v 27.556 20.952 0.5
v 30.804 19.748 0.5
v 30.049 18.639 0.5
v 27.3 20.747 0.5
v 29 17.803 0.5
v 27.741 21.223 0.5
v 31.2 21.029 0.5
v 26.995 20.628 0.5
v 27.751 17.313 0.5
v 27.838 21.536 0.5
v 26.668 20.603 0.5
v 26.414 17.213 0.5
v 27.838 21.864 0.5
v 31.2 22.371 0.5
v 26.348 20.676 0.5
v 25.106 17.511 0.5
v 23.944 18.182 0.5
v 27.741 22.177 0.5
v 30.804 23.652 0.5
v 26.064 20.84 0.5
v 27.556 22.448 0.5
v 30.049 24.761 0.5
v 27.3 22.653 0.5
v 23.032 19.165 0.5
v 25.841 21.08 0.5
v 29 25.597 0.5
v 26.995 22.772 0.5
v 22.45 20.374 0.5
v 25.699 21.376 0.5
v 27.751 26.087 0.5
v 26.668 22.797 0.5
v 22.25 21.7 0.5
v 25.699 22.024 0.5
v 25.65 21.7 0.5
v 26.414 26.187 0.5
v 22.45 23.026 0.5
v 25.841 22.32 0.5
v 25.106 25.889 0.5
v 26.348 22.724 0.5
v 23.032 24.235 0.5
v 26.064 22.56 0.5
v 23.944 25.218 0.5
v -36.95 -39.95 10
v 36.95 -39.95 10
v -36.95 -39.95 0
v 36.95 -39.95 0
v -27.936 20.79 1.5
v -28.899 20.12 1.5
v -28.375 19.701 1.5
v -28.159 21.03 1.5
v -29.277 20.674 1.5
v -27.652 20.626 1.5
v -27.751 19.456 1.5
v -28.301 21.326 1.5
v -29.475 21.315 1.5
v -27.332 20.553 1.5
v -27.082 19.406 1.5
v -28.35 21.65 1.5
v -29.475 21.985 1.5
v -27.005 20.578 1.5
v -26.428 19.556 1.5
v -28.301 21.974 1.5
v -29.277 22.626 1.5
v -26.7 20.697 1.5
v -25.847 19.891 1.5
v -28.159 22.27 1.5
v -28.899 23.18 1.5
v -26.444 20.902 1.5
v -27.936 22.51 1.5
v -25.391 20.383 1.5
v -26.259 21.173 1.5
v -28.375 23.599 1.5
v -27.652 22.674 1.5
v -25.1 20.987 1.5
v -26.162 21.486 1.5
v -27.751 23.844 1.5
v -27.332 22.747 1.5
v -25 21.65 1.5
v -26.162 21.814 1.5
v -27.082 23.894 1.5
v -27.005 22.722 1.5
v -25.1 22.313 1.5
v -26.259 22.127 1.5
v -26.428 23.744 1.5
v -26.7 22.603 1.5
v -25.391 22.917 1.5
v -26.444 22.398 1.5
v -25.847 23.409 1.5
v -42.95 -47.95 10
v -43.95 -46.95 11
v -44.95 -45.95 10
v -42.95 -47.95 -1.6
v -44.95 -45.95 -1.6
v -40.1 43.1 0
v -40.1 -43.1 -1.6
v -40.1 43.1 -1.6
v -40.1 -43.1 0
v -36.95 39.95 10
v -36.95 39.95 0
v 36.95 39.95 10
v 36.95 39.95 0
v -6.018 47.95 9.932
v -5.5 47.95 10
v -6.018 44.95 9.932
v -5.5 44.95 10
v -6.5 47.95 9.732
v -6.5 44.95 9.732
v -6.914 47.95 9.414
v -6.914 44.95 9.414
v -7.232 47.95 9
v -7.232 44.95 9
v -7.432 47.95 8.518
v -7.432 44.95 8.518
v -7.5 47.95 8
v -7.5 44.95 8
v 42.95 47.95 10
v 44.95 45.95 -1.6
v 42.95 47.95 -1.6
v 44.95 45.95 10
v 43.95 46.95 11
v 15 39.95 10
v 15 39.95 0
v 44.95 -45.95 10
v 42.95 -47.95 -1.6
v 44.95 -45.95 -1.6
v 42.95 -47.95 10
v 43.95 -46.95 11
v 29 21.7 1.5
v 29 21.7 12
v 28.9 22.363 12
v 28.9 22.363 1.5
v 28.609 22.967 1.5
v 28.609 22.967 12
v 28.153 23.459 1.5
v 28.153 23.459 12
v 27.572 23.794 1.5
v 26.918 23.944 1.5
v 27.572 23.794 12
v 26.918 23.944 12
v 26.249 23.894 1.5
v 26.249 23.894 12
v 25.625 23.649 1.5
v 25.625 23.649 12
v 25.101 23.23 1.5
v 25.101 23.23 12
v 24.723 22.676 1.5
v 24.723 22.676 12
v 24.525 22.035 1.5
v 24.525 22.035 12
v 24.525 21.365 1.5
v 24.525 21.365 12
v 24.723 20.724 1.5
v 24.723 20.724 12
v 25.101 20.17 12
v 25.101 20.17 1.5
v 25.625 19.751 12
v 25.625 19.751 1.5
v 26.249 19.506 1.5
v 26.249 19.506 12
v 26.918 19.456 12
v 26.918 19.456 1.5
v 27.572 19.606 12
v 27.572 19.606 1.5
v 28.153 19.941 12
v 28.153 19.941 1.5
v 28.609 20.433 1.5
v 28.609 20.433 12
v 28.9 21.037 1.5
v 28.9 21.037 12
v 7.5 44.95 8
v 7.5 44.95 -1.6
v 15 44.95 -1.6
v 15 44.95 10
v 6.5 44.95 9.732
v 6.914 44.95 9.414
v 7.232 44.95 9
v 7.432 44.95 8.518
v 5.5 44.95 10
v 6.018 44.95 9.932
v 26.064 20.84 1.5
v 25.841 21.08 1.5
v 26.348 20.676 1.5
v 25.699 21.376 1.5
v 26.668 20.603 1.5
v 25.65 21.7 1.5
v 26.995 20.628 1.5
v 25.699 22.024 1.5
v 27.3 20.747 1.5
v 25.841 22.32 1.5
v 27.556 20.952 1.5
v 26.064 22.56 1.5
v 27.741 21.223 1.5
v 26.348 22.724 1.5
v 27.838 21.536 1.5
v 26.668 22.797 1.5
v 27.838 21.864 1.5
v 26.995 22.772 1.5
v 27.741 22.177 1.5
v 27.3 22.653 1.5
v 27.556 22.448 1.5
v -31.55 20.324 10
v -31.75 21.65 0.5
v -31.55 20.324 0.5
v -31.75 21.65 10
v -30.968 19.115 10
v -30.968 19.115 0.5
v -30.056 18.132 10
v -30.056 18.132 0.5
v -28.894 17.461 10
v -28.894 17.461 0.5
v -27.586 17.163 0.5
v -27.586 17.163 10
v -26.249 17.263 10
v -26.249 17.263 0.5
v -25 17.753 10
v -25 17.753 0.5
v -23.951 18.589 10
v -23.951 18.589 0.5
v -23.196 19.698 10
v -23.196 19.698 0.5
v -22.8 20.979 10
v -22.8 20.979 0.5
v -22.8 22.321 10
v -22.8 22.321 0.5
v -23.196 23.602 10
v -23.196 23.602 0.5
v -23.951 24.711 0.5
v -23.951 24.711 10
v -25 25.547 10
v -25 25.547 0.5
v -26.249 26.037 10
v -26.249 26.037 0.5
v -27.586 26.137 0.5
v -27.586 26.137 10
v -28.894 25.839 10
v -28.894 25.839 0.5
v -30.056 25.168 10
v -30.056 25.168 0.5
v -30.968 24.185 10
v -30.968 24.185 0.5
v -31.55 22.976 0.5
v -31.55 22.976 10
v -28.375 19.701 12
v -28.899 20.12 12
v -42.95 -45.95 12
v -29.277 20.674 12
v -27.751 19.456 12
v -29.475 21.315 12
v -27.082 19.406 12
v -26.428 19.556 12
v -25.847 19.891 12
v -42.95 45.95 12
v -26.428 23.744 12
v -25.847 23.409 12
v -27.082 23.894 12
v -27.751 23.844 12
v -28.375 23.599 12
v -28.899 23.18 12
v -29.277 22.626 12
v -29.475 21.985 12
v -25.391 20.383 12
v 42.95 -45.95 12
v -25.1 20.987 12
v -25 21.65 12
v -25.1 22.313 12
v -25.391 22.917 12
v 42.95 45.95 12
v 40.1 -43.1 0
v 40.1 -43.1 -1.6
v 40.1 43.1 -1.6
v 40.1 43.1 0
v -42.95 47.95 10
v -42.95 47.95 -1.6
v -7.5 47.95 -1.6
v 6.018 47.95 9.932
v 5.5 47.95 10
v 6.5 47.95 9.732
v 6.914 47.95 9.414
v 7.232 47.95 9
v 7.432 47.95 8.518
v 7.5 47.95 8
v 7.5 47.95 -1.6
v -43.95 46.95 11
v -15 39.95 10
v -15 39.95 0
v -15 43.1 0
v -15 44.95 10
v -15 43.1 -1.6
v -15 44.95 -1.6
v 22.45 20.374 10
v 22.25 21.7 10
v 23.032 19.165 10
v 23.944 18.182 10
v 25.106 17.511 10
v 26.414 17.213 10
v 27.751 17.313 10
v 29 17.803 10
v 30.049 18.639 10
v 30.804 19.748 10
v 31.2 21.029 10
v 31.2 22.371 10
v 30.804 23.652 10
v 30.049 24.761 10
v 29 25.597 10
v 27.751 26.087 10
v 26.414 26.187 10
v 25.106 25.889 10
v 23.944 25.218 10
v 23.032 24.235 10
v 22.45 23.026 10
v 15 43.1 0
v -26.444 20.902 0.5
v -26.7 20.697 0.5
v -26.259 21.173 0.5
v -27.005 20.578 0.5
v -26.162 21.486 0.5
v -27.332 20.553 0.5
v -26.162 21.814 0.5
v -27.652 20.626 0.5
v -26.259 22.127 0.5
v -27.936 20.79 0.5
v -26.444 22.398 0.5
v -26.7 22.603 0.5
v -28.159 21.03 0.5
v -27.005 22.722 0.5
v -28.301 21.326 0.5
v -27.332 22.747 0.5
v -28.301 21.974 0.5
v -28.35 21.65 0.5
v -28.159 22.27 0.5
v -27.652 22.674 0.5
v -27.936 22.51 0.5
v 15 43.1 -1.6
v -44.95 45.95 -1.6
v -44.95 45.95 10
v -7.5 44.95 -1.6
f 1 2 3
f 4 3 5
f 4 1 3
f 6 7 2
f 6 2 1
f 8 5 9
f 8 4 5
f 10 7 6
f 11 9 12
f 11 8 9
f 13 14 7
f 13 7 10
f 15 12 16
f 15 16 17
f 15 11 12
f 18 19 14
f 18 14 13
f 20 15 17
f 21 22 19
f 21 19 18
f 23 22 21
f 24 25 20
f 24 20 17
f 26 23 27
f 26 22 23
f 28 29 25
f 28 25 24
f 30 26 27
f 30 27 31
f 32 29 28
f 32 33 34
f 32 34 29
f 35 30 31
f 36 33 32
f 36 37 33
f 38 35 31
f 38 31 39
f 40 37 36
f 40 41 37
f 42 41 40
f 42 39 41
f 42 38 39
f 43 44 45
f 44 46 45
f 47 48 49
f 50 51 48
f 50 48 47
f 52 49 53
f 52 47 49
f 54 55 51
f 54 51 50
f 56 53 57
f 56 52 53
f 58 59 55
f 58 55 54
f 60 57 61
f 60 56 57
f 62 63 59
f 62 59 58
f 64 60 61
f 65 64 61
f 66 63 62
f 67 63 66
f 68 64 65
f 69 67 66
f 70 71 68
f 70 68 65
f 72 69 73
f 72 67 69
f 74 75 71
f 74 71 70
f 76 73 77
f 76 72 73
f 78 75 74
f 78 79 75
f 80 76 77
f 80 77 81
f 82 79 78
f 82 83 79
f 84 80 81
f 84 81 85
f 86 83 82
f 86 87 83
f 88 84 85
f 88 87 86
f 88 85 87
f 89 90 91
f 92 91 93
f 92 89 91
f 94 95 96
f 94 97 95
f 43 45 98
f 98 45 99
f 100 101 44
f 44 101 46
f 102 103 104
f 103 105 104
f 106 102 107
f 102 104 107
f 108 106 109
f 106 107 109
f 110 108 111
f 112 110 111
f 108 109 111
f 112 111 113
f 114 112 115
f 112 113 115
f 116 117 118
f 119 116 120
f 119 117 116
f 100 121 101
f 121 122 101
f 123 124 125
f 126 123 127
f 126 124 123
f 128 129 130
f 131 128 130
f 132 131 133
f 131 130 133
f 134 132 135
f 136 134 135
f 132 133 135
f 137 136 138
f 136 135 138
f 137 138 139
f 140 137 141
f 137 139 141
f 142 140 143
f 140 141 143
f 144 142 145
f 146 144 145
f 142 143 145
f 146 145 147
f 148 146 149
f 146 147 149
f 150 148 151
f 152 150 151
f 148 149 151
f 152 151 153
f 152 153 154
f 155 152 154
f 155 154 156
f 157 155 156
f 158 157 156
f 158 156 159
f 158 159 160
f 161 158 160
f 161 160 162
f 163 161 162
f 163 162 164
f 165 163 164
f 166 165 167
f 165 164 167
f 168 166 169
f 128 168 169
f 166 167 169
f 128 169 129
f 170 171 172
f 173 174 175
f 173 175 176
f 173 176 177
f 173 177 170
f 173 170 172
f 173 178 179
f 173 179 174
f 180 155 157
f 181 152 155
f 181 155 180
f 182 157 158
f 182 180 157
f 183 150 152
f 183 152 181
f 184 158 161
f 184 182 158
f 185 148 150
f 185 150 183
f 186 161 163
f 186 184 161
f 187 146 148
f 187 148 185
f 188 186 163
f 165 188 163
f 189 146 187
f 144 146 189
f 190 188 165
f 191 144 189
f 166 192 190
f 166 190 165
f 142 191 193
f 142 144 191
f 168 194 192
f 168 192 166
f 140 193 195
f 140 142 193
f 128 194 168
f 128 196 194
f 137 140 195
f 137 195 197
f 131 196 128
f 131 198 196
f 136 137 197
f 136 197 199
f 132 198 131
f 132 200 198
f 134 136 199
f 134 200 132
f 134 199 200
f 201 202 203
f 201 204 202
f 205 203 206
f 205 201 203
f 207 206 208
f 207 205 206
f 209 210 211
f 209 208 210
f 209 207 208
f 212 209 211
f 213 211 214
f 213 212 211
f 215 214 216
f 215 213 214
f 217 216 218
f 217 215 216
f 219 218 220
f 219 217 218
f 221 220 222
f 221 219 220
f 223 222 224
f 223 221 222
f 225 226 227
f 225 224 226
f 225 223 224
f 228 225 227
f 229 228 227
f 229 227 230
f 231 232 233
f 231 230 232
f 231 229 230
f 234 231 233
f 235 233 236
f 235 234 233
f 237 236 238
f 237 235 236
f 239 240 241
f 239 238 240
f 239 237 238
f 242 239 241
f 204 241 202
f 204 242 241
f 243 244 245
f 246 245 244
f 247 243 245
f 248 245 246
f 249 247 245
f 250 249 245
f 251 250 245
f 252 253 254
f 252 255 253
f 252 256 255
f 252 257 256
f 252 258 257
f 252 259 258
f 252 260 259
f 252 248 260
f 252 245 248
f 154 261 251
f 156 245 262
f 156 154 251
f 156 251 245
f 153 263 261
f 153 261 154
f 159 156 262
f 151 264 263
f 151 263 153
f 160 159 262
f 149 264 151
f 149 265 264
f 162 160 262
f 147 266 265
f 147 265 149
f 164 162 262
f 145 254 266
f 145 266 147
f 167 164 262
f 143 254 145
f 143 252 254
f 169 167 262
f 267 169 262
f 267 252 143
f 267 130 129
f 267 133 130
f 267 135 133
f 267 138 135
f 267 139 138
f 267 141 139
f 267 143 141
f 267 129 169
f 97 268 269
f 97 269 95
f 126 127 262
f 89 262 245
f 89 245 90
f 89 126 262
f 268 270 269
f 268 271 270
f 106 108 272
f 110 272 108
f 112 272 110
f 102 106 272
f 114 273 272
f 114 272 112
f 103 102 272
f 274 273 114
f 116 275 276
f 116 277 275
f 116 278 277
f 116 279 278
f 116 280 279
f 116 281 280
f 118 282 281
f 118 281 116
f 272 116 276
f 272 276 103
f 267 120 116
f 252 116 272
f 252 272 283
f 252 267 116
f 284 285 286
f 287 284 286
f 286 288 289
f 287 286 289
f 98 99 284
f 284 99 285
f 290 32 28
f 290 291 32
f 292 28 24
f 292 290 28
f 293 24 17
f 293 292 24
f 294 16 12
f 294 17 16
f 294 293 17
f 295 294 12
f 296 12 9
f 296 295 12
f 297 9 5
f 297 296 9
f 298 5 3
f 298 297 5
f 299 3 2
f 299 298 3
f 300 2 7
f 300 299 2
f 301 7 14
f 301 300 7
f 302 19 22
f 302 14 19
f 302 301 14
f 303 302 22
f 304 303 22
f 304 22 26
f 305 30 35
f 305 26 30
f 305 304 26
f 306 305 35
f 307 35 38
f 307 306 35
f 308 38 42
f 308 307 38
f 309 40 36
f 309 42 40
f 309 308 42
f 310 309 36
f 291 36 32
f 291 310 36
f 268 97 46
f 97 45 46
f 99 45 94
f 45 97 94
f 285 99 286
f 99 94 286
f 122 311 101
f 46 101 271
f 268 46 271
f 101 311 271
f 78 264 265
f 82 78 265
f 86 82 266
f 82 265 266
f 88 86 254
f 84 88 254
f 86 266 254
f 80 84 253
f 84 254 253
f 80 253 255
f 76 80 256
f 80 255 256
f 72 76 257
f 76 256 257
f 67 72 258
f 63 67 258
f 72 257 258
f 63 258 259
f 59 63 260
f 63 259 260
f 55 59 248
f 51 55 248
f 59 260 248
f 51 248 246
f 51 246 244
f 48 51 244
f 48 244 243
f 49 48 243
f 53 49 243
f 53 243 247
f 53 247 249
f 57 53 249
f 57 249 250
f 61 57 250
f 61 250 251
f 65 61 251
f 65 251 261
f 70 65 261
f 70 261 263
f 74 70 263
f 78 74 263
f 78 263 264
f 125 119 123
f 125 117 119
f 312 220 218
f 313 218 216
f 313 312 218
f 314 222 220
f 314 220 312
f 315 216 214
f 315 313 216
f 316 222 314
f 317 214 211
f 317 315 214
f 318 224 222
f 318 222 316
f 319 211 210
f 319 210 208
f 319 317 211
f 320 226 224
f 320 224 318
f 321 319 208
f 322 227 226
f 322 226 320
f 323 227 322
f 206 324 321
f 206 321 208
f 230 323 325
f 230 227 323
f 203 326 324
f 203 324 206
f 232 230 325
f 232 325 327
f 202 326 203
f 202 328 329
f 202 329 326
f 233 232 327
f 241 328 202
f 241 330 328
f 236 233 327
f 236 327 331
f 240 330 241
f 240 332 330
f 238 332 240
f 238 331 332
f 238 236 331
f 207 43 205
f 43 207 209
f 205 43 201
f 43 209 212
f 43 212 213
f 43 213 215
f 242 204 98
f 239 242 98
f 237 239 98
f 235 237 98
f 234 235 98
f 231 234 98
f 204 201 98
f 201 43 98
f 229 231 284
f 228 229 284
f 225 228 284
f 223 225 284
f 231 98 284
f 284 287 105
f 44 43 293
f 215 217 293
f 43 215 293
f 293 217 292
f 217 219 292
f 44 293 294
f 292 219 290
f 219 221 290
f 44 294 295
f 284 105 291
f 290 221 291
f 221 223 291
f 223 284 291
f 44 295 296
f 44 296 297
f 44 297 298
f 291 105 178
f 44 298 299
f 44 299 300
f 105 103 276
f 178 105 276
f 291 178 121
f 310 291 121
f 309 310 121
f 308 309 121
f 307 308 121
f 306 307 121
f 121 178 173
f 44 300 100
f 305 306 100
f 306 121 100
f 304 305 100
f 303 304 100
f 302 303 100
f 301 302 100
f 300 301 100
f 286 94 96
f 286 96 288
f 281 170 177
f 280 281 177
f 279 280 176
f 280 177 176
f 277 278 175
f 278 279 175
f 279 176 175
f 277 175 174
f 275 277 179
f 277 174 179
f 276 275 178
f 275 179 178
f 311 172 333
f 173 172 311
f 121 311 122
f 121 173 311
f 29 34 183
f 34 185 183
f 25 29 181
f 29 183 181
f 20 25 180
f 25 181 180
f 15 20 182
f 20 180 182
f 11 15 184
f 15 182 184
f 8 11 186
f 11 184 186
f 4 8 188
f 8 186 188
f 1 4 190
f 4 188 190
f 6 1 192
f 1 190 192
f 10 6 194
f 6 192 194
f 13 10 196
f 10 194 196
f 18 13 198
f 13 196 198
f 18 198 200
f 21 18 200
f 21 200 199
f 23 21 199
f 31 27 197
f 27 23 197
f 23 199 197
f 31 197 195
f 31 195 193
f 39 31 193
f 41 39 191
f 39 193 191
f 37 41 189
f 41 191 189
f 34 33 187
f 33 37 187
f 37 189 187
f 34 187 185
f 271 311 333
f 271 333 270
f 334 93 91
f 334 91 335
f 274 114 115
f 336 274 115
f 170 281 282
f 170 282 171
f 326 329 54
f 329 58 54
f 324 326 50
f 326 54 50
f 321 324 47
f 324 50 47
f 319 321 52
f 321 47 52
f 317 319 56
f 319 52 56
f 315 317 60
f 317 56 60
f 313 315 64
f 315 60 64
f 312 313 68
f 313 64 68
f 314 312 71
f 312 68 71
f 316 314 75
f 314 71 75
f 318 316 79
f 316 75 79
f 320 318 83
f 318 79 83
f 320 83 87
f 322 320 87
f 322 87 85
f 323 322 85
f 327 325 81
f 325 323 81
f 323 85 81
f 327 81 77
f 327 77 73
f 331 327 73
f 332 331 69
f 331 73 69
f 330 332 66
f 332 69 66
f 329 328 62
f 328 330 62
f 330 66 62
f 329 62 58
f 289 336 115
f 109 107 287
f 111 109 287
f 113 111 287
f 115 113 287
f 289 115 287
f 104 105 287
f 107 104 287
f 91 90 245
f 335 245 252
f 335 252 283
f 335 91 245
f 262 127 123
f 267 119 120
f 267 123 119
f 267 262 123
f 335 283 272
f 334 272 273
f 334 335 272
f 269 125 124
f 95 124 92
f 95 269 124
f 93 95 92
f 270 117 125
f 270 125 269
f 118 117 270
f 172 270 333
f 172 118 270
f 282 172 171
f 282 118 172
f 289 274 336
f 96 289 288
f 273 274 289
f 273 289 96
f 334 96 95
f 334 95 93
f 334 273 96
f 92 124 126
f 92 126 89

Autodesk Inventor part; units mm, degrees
ref_plane "YZ Plane" through (0, 0, 0) normal (1, 0, 0) x (0, 1, 0)
ref_plane "XZ Plane" through (0, 0, 0) normal (0, 1, 0) x (-1, 0, 0)
ref_plane "XY Plane" through (0, 0, 0) normal (0, 0, 1) x (1, 0, 0)
sketch "Skizze1" plane through (0, 0, 0) normal (0, 0, 1) x (1, 0, 0)
  line L0 (-39.95, 42.95) -> (-39.95, -42.95) projected
  line L1 (-39.95, -42.95) -> (39.95, -42.95) projected
  line L2 (39.95, -42.95) -> (39.95, 42.95) projected
  line L3 (39.95, 42.95) -> (-39.95, 42.95) projected
  line L4 (-36.95, 39.95) -> (-15, 39.95)
  line L5 (36.95, 39.95) -> (36.95, -39.95)
  line L6 (36.95, -39.95) -> (-36.95, -39.95)
  line L7 (-36.95, -39.95) -> (-36.95, 39.95)
  line L8 (-36.95, 39.95) -> (36.95, -39.95) construction
  line L9 (36.95, 39.95) -> (-36.95, -39.95) construction
  line L10 (0, -67.13) -> (0, 67.13) projected
  line L11 (-15, 39.95) -> (-15, 42.95)
  line L12 (15, 39.95) -> (15, 42.95)
  line L13 (15, 39.95) -> (36.95, 39.95)
  line L14 (44.95, -47.95) -> (-44.95, -47.95)
  line L15 (-44.95, -47.95) -> (-44.95, 47.95)
  line L16 (-44.95, 47.95) -> (-15, 47.95)
  line L17 (44.95, 47.95) -> (44.95, -47.95)
  line L18 (44.95, -47.95) -> (-44.95, 47.95) construction
  line L19 (-44.95, -47.95) -> (44.95, 47.95) construction
  line L20 (-15, 42.95) -> (-15, 47.95)
  line L21 (15, 42.95) -> (15, 47.95)
  line L22 (15, 47.95) -> (44.95, 47.95)
  point P0 (0, 0)
  point P1 (-15, 41.45)
  dimension "d0" = 3
  dimension "d1" = 3
  dimension "d2" = 30
  dimension "d4" = 5
  dimension "d5" = 5
extrude "Extrusion1" add sketch "Skizze1" along normal blind 10 contours L3 L11 L4 L7 L6 L10 L1 L0 | L0 L1 L10 L14 L15 L16 L20 L3 | L10 L6 L5 L13 L12 L3 L2 L1 | L1 L2 L3 L21 L22 L17 L14 L10
sketch "Skizze2" plane through (0, 0, 0) normal (0, 0, -1) x (-1, 0, 0)
  line L0 (-39.95, 42.95) -> (39.95, 42.95) projected
  line L1 (39.95, 42.95) -> (39.95, -42.95) projected
  line L2 (39.95, -42.95) -> (-39.95, -42.95) projected
  line L3 (-39.95, -42.95) -> (-39.95, 42.95) projected
  line L4 (-44.95, -47.95) -> (-44.95, 47.95) projected
  line L5 (-44.95, 47.95) -> (-15, 47.95) projected
  line L6 (44.95, -47.95) -> (-44.95, -47.95) projected
  line L7 (44.95, 47.95) -> (44.95, -47.95) projected
  line L8 (15, 47.95) -> (44.95, 47.95) projected
  line L9 (15, 39.95) -> (15, 47.95) projected
  line L10 (15, 47.95) -> (44.95, 47.95) projected
  line L11 (15, 47.95) -> (15, 42.95)
  line L12 (15, 39.95) -> (15, 47.95) projected
  line L13 (15, 47.95) -> (44.95, 47.95)
  line L14 (44.95, 47.95) -> (44.95, -47.95) projected
  line L15 (44.95, -47.95) -> (44.95, 47.95)
  line L16 (15, 42.95) -> (39.95, 42.95)
  line L17 (39.95, 42.95) -> (39.95, -42.95)
  line L18 (39.95, -42.95) -> (-39.95, -42.95)
  line L19 (-39.95, 42.95) -> (-39.95, -42.95)
  line L20 (-39.95, 42.95) -> (-15, 42.95)
  line L21 (-15, 47.95) -> (-15, 39.95) projected
  line L22 (-15, 42.95) -> (-15, 47.95)
  line L23 (-44.95, -47.95) -> (-44.95, 47.95) projected
  line L24 (-15, 47.95) -> (-44.95, 47.95)
  line L25 (-44.95, 47.95) -> (-44.95, -47.95)
  line L26 (-40.1, -43.1) -> (40.1, -43.1)
  line L27 (40.1, -43.1) -> (40.1, 43.1)
  line L28 (40.1, 43.1) -> (-40.1, 43.1)
  line L29 (-40.1, 43.1) -> (-40.1, -43.1)
  line L30 (-40.1, -43.1) -> (40.1, 43.1) construction
  line L31 (40.1, -43.1) -> (-40.1, 43.1) construction
  point P0 (0, 0)
  point P1 (15, 43.1)
  point P2 (-15, 43.1)
  dimension "d35" = 80.2
  dimension "d36" = 86.2
extrude "Extrusion2" add sketch "Skizze2" along normal blind 1.6 contours L28 L29 L26 L27 L9 L8 L7 L6 L4 L5 L21
sketch "Skizze3" plane through (0, 0, 10) normal (0, 0, 1) x (1, 0, 0)
  line L0 (44.95, -47.95) -> (-44.95, -47.95) projected
  line L1 (-44.95, 47.95) -> (44.95, 47.95)
  line L2 (44.95, 47.95) -> (44.95, -47.95)
  line L3 (44.95, -47.95) -> (-44.95, -47.95)
  line L4 (-44.95, -47.95) -> (-44.95, 47.95)
  point P0 (0, 0)
extrude "Extrusion3" add sketch "Skizze3" along normal blind 2
sketch "Skizze4" plane through (0, 0, 10) normal (0, 0, -1) x (-1, 0, 0)
  line L0 (15, 39.95) -> (15, 47.95) projected
  line L1 (-15, 47.95) -> (15, 47.95) projected
  line L2 (-15, 47.95) -> (-15, 39.95) projected
  line L3 (-15, 39.95) -> (-36.95, 39.95) projected
  line L4 (-36.95, 39.95) -> (-36.95, -39.95) projected
  line L5 (-36.95, -39.95) -> (36.95, -39.95) projected
  line L6 (36.95, -39.95) -> (36.95, 39.95) projected
  line L7 (36.95, 39.95) -> (15, 39.95) projected
  line L8 (0, -67.13) -> (0, 67.13) projected
  line L9 (-15, 47.95) -> (15, 47.95) projected
  line L10 (15, 47.95) -> (7.5, 47.95)
  line L11 (7.5, 47.95) -> (7.5, 44.95)
  line L12 (7.5, 44.95) -> (15, 44.95)
  line L13 (15, 44.95) -> (15, 47.95)
  line L14 (-15, 39.95) -> (-15, 47.95)
  line L15 (15, 47.95) -> (-15, 47.95)
  line L16 (-7.5, 47.95) -> (-7.5, 44.95)
  line L17 (-7.5, 44.95) -> (-15, 44.95)
  point P0 (0, 0)
  point P1 (-7.5, 47.95)
  point P2 (-15, 44.95)
  point P3 (15, 44.95)
  point P4 (7.5, 47.95)
  point P5 (7.5, 46.45)
  point P6 (11.25, 47.95)
  dimension "d14" = 15
  dimension "d15" = 3
extrude "Extrusion4" add sketch "Skizze4" along normal up to surface (11.6 mm away) contours L12 L11 L1 L0 | L16 L17 L2 L1
fillet "Rundung1" radius 2 2 edges at (-7.5, 46.45, 10) (7.5, 46.45, 10)
fillet "Rundung2" [suppressed]
fillet "Rundung3" [suppressed]
sketch "Skizze5" plane through (0, 0, 10) normal (0, 0, -1) x (-1, 0, 0)
  circle A0 centre (-26.75, 21.7) radius 1.1 projected
  circle A1 centre (27.25, 21.65) radius 1.1 projected
  point P0 (0, 0)
extrude "Extrusion5" cut sketch "Skizze5" against normal through all
sketch "Skizze6" plane through (0, 0, 10) normal (0, 0, -1) x (-1, 0, 0)
  point P0 (0, 0)
sketch "Skizze7" plane through (0, 0, 10) normal (0, 0, -1) x (-1, 0, 0)
  circle A0 centre (27.25, 21.65) radius 1.1 projected
  circle A1 centre (-26.75, 21.7) radius 1.1 projected
  line L0 (-5.5, 44.95) -> (-5.5, 47.95) projected
  line L1 (-5.5, 44.95) -> (-15, 44.95) projected
  line L2 (-15, 44.95) -> (-15, 39.95) projected
  line L3 (-15, 39.95) -> (-36.95, 39.95) projected
  line L4 (-36.95, 39.95) -> (-36.95, -39.95) projected
  line L5 (-36.95, -39.95) -> (36.95, -39.95) projected
  line L6 (36.95, -39.95) -> (36.95, 39.95) projected
  line L7 (36.95, 39.95) -> (15, 39.95) projected
  line L8 (15, 39.95) -> (15, 44.95) projected
  line L9 (15, 44.95) -> (5.5, 44.95) projected
  line L10 (5.5, 47.95) -> (5.5, 44.95) projected
  circle A2 centre (27.25, 21.65) radius 1.1 projected
  circle A3 centre (27.25, 21.65) radius 4.5
  line L11 (0, -67.13) -> (0, 67.13) projected
  circle A4 centre (-26.75, 21.7) radius 4.5
  line L12 (-5.5, 47.95) -> (5.5, 47.95) projected
  point P0 (0, 0)
  dimension "d21" = 9
extrude "Extrusion6" add sketch "Skizze7" along normal blind 9.5 contours A3 | A4
sketch "Skizze8" plane through (0, 0, 12) normal (0, 0, 1) x (1, 0, 0)
  line L0 (0, -67.13) -> (0, 67.13) projected
  circle A0 centre (-27.25, 21.65) radius 1.1 projected
  circle A1 centre (-27.25, 21.65) radius 2.25
  circle A2 centre (26.75, 21.7) radius 1.1 projected
  circle A3 centre (26.75, 21.7) radius 2.25
  point P0 (0, 0)
  dimension "d24" = 4.5
  dimension "d25" = 4.5
extrude "Extrusion7" cut sketch "Skizze8" against normal blind 10.5
chamfer "Fase1" distance 2 angle 45 4 edges at (44.95, 0, 12) (0, -47.95, 12) (0, 47.95, 12) (-44.95, 0, 12)
chamfer "Fase2" distance 2 angle 45 4 edges at (-44.95, 47.95, 4.2002) (-44.95, -47.95, 4.2003) (44.95, -47.95, 4.2003) (44.95, 47.95, 4.2002)
properties part number "Bottom" material "Glas"
